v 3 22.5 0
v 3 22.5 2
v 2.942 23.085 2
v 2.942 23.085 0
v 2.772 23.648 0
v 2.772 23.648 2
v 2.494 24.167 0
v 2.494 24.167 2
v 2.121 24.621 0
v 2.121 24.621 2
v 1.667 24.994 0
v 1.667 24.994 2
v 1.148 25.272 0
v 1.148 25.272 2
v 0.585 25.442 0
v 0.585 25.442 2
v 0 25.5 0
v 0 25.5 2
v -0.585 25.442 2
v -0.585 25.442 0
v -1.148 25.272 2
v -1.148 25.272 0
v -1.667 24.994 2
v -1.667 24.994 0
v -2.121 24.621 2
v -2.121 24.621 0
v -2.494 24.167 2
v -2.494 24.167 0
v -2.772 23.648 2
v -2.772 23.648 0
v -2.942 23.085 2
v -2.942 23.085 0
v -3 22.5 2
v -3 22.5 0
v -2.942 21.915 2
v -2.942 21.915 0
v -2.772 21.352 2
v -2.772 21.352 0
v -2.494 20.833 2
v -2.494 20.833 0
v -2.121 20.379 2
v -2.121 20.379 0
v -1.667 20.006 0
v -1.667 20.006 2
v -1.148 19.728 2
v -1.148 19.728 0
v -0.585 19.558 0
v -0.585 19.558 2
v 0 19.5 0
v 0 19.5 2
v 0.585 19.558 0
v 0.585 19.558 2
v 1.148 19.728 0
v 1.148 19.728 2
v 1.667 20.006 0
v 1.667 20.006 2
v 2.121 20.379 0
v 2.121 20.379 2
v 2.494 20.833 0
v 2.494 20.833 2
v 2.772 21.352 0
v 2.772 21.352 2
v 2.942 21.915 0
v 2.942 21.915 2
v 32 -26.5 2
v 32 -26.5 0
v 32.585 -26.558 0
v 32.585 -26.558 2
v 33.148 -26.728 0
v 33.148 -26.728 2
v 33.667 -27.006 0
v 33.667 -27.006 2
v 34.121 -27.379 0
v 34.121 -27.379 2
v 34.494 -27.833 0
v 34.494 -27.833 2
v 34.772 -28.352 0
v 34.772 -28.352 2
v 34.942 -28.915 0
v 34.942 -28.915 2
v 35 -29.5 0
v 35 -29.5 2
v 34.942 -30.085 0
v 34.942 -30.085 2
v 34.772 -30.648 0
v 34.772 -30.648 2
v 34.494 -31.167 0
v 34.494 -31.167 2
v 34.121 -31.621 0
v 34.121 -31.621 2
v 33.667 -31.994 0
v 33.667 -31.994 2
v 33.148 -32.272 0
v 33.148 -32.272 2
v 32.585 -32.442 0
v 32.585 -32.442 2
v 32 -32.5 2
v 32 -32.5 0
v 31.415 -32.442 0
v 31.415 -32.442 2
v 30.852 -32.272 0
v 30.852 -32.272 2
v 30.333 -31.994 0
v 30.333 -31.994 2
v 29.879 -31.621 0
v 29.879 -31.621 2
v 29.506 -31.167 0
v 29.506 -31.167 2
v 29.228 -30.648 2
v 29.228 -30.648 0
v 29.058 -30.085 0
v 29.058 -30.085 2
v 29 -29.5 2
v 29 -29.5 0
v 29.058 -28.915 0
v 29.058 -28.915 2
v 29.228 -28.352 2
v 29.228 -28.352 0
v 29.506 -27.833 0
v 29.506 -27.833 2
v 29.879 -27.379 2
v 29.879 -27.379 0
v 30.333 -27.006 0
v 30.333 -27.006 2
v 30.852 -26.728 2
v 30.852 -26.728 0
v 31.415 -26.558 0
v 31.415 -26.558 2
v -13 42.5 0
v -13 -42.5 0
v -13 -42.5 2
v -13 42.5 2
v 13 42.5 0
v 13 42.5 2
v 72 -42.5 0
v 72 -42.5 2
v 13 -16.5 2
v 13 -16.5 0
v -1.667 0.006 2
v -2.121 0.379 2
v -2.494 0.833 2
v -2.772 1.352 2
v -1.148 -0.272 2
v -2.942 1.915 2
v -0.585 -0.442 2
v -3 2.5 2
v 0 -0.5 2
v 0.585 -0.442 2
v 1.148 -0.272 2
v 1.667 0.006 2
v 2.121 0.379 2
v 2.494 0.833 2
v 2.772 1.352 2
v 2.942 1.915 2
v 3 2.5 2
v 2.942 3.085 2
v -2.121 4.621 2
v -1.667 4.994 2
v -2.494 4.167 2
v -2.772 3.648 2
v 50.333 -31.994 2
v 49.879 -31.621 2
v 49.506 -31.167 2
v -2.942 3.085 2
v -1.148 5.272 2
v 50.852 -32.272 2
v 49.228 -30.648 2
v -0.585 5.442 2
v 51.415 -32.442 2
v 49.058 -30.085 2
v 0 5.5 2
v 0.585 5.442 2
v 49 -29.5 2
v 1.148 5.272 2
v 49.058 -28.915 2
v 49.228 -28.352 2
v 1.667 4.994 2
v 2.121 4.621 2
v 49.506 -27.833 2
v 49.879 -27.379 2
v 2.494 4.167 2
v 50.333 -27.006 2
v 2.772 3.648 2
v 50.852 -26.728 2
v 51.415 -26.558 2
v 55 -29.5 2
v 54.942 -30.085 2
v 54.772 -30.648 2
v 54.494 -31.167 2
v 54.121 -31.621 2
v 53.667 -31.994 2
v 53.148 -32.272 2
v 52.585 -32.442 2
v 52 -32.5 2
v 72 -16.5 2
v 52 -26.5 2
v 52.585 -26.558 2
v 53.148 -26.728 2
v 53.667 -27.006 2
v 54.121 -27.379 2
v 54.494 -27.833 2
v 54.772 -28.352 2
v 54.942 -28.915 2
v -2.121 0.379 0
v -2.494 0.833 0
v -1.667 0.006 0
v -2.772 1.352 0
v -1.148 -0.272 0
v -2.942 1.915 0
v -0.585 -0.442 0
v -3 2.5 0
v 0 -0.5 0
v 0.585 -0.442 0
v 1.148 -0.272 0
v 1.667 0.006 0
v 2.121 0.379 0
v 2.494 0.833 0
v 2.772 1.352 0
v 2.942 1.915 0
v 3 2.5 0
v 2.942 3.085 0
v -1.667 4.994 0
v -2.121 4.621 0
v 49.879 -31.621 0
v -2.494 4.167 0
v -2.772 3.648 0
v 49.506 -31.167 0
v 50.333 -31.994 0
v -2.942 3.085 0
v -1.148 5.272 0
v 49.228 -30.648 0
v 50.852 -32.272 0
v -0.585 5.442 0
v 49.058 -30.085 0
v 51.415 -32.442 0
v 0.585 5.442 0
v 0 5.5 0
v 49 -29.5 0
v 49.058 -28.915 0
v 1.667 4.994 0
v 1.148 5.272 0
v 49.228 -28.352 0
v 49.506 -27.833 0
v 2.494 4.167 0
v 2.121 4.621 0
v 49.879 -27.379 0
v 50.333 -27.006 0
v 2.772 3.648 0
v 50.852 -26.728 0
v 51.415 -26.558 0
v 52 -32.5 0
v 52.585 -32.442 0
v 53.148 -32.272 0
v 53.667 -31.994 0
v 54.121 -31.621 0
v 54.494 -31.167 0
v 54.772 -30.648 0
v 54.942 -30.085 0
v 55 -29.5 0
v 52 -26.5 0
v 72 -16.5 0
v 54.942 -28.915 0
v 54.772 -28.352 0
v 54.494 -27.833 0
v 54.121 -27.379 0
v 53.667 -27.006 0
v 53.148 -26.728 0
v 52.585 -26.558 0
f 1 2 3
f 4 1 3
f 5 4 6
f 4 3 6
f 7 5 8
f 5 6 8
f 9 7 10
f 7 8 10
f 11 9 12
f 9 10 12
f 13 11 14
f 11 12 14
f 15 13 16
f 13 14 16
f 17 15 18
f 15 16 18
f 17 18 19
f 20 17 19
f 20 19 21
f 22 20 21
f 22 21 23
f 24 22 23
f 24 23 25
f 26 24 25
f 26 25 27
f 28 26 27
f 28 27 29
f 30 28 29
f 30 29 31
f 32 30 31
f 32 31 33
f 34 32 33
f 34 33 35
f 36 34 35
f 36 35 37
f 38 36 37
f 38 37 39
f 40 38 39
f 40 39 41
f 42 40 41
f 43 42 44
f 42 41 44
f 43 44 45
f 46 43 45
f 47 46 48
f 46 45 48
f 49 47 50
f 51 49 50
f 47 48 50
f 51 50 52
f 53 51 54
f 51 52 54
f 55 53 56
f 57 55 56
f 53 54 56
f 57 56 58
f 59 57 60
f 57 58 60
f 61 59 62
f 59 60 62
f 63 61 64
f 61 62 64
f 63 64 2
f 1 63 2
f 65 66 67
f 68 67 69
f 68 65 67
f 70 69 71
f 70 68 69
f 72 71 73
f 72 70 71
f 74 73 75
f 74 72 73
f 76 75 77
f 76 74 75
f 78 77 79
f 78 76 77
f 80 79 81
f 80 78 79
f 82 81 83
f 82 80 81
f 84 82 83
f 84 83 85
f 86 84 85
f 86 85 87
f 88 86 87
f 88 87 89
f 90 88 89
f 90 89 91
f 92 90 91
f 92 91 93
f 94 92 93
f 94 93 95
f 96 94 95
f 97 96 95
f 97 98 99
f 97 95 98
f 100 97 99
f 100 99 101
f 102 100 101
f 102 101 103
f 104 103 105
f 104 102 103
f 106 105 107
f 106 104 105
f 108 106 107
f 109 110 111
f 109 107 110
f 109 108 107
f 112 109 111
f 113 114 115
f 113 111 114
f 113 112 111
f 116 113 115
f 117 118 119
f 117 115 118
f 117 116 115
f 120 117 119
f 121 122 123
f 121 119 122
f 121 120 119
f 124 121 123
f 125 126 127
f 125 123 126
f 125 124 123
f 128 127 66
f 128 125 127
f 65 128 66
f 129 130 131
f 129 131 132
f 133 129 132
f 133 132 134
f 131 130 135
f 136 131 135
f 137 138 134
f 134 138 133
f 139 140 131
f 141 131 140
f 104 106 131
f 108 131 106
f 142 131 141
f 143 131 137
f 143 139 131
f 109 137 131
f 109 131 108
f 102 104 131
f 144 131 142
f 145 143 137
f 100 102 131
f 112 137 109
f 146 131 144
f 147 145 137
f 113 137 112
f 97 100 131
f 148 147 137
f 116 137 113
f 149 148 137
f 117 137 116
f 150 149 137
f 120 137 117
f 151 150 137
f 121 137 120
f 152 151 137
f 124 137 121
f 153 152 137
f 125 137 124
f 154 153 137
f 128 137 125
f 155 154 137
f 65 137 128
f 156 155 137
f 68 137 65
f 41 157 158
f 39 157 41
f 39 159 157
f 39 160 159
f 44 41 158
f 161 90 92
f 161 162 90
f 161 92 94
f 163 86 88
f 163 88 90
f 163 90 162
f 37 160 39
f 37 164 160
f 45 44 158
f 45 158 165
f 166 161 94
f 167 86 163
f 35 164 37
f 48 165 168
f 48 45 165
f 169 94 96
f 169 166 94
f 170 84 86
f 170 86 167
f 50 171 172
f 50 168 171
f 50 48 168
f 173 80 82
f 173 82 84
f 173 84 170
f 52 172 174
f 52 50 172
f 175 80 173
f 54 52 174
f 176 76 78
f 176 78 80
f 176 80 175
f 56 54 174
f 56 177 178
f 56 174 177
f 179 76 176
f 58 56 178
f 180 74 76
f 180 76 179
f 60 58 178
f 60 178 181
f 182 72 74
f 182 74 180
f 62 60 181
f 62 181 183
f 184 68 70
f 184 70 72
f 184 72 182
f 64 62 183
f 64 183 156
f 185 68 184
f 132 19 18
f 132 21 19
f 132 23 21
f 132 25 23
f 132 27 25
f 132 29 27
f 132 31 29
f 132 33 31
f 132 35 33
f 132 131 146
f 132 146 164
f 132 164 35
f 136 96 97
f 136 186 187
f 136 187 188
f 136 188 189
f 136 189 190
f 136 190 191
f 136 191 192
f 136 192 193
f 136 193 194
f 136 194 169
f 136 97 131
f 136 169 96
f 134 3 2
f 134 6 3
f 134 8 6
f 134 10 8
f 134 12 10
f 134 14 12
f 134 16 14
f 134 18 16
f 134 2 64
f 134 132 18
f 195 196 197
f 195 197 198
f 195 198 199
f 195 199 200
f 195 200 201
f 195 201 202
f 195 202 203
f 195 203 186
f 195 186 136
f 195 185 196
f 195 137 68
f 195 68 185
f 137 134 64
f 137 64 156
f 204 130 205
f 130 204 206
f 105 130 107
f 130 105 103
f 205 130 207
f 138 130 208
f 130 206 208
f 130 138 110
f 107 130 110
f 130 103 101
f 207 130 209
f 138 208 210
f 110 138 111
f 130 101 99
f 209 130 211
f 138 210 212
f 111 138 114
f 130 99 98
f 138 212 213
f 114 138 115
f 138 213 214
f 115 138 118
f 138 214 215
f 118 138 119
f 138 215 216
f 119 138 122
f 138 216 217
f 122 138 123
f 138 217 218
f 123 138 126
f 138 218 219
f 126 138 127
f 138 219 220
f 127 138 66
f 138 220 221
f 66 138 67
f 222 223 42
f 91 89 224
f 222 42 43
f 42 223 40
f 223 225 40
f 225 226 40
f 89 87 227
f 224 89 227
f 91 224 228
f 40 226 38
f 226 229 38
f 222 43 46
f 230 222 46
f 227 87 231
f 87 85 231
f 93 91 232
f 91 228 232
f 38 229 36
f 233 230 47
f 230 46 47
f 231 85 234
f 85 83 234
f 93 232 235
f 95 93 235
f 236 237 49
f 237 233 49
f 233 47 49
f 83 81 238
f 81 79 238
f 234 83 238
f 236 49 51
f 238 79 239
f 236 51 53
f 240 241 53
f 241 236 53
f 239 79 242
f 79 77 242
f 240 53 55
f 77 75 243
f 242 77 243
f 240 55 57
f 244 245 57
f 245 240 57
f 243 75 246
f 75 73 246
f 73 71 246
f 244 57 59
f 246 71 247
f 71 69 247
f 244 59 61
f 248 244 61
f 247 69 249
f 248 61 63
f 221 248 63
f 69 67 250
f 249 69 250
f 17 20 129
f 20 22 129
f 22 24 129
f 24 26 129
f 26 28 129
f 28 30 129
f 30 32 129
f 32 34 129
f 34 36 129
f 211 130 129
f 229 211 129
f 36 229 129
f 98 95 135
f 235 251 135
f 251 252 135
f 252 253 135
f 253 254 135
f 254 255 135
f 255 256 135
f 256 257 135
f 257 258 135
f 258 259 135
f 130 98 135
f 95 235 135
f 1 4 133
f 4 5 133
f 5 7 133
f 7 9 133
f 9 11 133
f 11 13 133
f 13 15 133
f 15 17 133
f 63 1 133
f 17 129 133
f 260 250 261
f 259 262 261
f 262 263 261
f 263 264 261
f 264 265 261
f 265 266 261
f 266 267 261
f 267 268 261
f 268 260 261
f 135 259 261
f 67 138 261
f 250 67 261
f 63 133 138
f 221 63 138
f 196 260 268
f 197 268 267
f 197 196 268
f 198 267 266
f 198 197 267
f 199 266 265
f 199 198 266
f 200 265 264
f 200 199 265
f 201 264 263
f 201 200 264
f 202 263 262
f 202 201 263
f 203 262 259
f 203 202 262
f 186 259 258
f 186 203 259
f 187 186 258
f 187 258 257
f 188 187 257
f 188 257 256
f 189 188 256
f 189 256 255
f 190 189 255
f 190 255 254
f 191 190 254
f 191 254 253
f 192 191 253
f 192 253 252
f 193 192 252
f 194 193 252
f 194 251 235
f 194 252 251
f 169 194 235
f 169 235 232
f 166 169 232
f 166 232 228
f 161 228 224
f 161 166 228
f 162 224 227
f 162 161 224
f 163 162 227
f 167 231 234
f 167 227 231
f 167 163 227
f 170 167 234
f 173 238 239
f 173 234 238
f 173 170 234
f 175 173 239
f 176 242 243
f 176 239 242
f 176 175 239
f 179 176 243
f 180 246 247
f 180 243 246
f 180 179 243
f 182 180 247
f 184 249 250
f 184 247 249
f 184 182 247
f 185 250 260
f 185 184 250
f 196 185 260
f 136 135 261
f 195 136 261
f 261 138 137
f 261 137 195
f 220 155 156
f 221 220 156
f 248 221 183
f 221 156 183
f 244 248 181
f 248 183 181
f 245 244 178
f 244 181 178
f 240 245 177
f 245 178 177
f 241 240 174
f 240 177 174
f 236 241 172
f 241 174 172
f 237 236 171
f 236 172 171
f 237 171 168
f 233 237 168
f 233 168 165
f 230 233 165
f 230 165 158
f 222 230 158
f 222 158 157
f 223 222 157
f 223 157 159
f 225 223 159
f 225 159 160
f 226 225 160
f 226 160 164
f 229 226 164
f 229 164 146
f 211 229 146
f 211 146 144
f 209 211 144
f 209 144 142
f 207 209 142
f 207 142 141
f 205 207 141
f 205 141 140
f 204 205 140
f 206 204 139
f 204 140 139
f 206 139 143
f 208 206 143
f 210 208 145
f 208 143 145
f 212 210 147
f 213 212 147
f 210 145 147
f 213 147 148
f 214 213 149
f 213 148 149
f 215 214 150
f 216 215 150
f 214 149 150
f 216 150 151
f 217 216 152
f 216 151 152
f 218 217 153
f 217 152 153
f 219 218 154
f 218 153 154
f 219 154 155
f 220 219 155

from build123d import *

# Parameters (mm, degrees)
SKETCH_1_W          = 26
SKETCH_1_H          = 85
EXTRUDE_1_DEPTH     = 2
SKETCH_2_R          = 3
CUT_EXTRUDE_1_DEPTH = 10


with BuildPart() as part:
    # 草图1 → 凸台-拉伸1 (new body)
    with BuildSketch(Plane.XY):
        Rectangle(SKETCH_1_W, SKETCH_1_H)
    extrude_1 = extrude(amount=EXTRUDE_1_DEPTH)

    # 镜向1: 凸台-拉伸1 across plane
    add(extrude_1.mirror(Plane(origin=(14.75, -14.75, 0), x_dir=(0, 0, 1), z_dir=(0.7071067811865488, -0.7071067811865464, 0))))

    # 草图2 → 切除-拉伸1 (cut)
    with BuildSketch(Plane.XY.offset(2)):
        with Locations((0, 22.5)):
            Circle(SKETCH_2_R)
        with Locations((0, 2.5)):
            Circle(SKETCH_2_R)
    cut_extrude_1 = extrude(amount=-CUT_EXTRUDE_1_DEPTH, mode=Mode.SUBTRACT)

    # 镜向2: 切除-拉伸1 across plane
    add(cut_extrude_1.mirror(Plane(origin=(14.75, -14.75, 0), x_dir=(0, 0, 1), z_dir=(0.7071067811865479, -0.7071067811865471, 0))), mode=Mode.SUBTRACT)


solid = part.part
